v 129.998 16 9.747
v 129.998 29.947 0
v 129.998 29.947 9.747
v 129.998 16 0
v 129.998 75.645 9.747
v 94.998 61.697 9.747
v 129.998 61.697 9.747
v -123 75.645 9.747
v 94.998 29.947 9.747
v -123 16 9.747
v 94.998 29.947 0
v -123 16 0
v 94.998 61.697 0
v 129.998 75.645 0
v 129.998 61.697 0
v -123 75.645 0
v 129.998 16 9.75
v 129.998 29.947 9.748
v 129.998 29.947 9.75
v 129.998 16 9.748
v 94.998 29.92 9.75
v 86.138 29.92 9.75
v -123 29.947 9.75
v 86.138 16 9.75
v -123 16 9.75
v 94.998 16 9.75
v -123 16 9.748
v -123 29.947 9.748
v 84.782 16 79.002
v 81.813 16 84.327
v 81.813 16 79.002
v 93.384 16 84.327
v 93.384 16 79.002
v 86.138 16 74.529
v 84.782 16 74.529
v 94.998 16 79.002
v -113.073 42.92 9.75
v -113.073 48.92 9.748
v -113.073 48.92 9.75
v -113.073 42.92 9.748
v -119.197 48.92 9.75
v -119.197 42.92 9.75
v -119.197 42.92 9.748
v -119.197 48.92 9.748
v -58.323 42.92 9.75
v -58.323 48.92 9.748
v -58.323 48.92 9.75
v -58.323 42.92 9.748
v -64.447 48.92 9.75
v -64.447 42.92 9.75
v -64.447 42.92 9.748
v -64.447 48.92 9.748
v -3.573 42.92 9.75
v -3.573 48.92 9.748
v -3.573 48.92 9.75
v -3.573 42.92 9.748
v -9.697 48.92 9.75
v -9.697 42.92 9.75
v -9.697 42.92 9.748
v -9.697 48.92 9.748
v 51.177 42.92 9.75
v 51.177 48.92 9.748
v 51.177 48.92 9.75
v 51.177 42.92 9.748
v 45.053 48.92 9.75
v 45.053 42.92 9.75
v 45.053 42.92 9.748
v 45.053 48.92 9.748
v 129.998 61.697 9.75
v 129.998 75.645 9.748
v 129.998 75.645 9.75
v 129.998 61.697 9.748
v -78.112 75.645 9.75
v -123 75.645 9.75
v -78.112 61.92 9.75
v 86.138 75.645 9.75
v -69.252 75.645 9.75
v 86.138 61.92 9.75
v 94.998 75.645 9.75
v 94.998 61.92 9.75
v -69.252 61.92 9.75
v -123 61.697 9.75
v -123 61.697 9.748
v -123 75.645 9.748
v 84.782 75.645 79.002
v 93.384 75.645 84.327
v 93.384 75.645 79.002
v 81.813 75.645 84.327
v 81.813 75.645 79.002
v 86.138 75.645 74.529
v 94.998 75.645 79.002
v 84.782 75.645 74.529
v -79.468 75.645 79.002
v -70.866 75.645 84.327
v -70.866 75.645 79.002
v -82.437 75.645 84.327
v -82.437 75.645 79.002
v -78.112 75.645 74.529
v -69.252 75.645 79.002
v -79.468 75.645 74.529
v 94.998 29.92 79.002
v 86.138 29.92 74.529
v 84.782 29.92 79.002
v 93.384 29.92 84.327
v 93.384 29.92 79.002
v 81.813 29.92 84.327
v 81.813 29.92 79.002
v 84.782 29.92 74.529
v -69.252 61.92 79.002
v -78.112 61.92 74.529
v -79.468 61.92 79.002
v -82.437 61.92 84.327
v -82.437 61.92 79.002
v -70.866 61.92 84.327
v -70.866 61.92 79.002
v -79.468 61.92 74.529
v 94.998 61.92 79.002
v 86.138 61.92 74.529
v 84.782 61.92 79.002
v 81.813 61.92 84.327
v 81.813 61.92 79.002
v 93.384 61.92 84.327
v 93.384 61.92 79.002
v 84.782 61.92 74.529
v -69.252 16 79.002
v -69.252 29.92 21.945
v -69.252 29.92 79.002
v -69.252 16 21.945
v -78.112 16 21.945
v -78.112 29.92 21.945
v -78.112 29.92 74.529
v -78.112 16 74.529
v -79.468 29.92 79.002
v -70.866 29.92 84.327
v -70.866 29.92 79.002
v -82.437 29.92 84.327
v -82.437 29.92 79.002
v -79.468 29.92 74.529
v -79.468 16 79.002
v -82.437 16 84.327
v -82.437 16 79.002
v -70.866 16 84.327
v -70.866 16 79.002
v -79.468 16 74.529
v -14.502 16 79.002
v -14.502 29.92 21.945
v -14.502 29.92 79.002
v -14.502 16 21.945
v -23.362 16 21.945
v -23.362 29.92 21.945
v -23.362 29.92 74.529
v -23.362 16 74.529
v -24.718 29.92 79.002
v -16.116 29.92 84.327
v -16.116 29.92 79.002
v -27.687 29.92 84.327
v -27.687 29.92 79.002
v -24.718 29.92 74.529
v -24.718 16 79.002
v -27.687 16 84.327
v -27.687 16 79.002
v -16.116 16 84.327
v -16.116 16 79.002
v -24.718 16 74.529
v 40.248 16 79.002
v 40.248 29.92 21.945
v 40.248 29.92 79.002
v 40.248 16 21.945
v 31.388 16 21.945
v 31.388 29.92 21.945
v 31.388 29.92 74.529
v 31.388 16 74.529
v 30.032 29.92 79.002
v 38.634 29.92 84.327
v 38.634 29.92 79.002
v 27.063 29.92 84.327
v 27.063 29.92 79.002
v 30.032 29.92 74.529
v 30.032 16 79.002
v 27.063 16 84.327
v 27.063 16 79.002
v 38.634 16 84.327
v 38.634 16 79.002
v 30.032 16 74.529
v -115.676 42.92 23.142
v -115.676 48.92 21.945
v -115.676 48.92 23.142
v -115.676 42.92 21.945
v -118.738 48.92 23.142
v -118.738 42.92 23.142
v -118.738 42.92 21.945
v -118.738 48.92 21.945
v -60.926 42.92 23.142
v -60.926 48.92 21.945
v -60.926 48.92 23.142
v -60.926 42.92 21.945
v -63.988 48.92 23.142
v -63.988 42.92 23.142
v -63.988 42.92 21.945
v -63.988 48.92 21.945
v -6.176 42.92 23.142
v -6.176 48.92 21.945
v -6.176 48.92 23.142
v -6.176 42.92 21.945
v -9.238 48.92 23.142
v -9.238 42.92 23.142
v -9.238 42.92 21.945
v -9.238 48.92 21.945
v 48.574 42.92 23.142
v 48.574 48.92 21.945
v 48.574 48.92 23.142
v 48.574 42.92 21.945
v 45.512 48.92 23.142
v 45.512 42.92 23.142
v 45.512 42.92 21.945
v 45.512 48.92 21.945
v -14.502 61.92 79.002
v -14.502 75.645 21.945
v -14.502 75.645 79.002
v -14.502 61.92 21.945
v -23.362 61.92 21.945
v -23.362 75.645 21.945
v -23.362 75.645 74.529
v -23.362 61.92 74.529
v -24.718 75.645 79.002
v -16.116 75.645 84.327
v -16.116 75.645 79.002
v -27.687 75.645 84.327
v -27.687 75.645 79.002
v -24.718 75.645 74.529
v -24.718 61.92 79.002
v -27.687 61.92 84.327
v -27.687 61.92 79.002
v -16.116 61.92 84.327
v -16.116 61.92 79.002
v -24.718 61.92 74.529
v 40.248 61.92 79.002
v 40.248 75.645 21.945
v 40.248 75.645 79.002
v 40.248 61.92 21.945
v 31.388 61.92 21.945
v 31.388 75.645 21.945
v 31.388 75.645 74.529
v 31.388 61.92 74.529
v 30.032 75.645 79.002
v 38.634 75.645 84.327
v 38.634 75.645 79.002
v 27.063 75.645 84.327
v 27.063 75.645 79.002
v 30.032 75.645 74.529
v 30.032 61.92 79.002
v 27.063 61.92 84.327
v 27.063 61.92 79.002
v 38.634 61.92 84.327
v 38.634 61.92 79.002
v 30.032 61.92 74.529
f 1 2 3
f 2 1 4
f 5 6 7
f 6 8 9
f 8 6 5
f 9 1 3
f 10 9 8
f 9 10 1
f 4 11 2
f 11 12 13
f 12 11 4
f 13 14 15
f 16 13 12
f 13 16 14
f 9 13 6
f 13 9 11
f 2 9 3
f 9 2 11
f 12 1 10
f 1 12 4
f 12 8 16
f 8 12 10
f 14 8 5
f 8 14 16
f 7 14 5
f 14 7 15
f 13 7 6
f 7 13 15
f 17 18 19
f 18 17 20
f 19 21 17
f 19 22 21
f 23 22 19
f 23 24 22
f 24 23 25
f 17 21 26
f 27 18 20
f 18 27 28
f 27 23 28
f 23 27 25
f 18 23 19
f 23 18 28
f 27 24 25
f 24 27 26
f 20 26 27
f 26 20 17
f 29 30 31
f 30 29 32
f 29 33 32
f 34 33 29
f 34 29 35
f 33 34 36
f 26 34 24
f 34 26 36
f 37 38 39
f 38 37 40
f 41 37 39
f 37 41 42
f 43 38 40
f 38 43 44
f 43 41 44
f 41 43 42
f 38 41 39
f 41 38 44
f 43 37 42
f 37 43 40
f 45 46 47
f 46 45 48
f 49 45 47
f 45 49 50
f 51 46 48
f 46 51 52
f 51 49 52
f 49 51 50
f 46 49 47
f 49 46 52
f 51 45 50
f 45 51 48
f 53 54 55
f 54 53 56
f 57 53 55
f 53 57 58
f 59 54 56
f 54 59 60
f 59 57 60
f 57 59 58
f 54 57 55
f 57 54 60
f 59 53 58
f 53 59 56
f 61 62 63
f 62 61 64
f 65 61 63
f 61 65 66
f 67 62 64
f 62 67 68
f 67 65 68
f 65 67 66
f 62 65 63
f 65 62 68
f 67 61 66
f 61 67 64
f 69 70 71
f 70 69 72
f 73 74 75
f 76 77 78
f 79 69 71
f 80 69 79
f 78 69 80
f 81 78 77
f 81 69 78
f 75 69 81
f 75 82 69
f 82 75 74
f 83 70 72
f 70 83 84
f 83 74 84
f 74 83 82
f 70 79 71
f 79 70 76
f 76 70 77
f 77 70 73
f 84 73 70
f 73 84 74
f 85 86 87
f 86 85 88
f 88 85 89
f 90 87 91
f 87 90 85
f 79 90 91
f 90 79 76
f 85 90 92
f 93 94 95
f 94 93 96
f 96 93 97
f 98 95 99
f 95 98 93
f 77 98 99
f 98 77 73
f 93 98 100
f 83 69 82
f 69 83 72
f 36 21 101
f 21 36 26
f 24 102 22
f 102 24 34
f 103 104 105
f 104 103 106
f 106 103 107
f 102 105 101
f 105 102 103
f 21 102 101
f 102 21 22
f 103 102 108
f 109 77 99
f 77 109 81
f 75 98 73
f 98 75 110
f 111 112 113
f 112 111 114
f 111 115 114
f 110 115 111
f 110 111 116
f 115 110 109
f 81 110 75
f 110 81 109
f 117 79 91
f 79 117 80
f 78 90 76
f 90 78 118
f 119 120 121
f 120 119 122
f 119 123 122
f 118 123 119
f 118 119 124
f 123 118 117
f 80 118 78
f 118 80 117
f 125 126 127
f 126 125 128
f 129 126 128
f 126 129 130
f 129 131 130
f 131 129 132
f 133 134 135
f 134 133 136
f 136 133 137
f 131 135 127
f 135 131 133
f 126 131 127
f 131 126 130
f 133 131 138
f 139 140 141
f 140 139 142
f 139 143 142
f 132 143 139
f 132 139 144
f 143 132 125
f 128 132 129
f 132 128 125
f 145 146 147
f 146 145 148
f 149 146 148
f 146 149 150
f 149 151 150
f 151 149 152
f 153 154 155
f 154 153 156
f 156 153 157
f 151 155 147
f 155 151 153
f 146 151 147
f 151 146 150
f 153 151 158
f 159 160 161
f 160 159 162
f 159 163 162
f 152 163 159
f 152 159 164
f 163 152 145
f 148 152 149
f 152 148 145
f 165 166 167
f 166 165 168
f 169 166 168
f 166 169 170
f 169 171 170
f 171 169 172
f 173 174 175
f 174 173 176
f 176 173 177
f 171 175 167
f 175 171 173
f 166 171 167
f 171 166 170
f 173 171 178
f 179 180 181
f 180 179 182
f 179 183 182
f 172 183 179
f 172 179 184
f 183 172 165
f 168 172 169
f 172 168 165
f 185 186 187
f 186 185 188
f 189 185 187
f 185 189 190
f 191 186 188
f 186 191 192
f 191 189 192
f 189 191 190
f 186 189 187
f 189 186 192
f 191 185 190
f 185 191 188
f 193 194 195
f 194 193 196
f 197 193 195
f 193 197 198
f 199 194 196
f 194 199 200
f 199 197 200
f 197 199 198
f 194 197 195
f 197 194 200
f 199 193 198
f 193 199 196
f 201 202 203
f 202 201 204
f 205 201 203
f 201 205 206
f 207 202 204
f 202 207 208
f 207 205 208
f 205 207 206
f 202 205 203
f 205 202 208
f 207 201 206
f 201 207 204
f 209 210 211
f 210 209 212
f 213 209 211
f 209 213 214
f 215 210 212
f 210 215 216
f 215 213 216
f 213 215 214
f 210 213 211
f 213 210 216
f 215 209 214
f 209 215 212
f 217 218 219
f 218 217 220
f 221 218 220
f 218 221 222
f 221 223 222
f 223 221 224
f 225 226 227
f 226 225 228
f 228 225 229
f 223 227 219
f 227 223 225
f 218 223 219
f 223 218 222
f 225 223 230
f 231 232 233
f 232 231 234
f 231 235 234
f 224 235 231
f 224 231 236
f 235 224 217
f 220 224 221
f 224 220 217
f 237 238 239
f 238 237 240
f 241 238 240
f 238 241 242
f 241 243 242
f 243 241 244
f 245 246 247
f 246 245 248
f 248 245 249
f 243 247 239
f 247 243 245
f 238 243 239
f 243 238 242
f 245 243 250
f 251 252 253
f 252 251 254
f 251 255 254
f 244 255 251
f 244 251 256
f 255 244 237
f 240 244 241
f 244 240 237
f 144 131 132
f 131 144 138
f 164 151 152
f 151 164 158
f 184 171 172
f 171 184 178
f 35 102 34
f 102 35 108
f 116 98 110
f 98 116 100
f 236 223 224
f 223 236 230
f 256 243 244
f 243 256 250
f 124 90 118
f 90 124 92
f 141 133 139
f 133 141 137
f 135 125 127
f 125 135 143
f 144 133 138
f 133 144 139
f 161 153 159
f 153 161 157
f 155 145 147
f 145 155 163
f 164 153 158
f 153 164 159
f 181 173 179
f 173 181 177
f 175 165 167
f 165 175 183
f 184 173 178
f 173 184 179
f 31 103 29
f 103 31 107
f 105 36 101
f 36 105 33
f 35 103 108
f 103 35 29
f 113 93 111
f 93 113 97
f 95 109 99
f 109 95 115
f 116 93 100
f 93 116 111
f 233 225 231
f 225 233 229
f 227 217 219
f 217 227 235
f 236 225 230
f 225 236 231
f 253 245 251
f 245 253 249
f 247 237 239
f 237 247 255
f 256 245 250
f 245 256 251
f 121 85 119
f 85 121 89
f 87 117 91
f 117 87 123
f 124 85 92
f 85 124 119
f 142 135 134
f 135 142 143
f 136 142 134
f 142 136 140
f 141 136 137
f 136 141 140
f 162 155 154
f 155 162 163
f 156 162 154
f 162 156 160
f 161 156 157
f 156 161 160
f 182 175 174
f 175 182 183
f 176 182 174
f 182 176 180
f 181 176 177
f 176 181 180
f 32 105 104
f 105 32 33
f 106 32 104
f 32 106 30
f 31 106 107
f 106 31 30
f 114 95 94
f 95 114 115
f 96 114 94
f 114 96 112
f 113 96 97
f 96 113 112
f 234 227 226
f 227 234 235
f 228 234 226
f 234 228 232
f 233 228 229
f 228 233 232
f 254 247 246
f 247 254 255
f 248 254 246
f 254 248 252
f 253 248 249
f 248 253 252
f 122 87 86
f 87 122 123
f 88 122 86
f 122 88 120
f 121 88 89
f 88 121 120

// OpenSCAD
// Rewritten from layered polygon rebuild into rectilinear cubes
// Each slab is decomposed into axis-aligned rectangles and emitted as cubes.
// Note: This preserves orthogonal geometry; curved/diagonal features (if any) are approximated.

module rect_prism(x1,y1,x2,y2,z0,h){
  translate([x1,y1,z0]) cube([x2-x1, y2-y1, h], center=false);
}

module slab_1() {
  union() {
    rect_prism(94.997986,15.999999,129.997986,29.946999,0,9.747);
    rect_prism(-123.000008,15.999999,94.997986,75.644997,0,9.747);
    rect_prism(94.997986,61.696999,129.997986,75.644997,0,9.747);
  }
}

module slab_2() {
  union() {
    rect_prism(-123.000008,15.999999,129.997986,29.946999,9.748,0.002);
    rect_prism(-119.196615,42.919998,-113.073431,48.919998,9.748,0.002);
    rect_prism(-64.44663,42.919998,-58.323427,48.919998,9.748,0.002);
    rect_prism(-9.696628,42.919998,-3.573428,48.919998,9.748,0.002);
    rect_prism(45.053381,42.919998,51.176573,48.919998,9.748,0.002);
    rect_prism(-123.000008,61.696999,129.997986,75.644997,9.748,0.002);
  }
}

module slab_3() {
  union() {
    //rect_prism(-78.112015,15.999999,-69.252014,29.919998,9.75,12.195);
    //rect_prism(-23.362015,15.999999,-14.502014,29.919998,9.75,12.195);
    //rect_prism(31.387985,15.999999,40.247986,29.919998,9.75,12.195);
    rect_prism(86.137985,15.999999,94.997986,29.919998,9.75,12.195);
    //rect_prism(-120.43741,42.919998,-114.314075,48.919998,9.75,12.195);
    //rect_prism(-65.687418,42.919998,-59.564071,48.919998,9.75,12.195);
    //rect_prism(-10.937418,42.919998,-4.814072,48.919998,9.75,12.195);
    //rect_prism(43.812582,42.919998,49.935932,48.919998,9.75,12.195);
    rect_prism(-78.112015,61.919998,-69.252014,75.644997,9.75,12.195);
    //rect_prism(-23.362015,61.919998,-14.502014,75.644997,9.75,12.195);
    //rect_prism(31.387985,61.919998,40.247986,75.644997,9.75,12.195);
    rect_prism(86.137985,61.919998,94.997986,75.644997,9.75,12.195);
  }
}

module slab_4() {
  union() {
    rect_prism(-78.112015,15.999999,-69.252014,29.919998,21.945,1.197);
    rect_prism(-23.362015,15.999999,-14.502014,29.919998,21.945,1.197);
    rect_prism(31.387985,15.999999,40.247986,29.919998,21.945,1.197);
    rect_prism(86.137985,15.999999,94.997986,29.919998,21.945,1.197);
    rect_prism(-118.738005,42.919998,-115.676272,48.919998,21.945,1.197);
    rect_prism(-63.988003,42.919998,-60.926268,48.919998,21.945,1.197);
    rect_prism(-9.238005,42.919998,-6.176269,48.919998,21.945,1.197);
    rect_prism(45.511995,42.919998,48.573739,48.919998,21.945,1.197);
    rect_prism(-78.112015,61.919998,-69.252014,75.644997,21.945,1.197);
    rect_prism(-23.362015,61.919998,-14.502014,75.644997,21.945,1.197);
    rect_prism(31.387985,61.919998,40.247986,75.644997,21.945,1.197);
    rect_prism(86.137985,61.919998,94.997986,75.644997,21.945,1.197);
  }
}

module slab_5() {
  union() {
    rect_prism(-78.112015,15.999999,-69.252014,29.919998,23.142,51.387);
    rect_prism(-23.362015,15.999999,-14.502014,29.919998,23.142,51.387);
    rect_prism(31.387985,15.999999,40.247986,29.919998,23.142,51.387);
    rect_prism(86.137985,15.999999,94.997986,29.919998,23.142,51.387);
    rect_prism(-78.112015,61.919998,-69.252014,75.644997,23.142,51.387);
    rect_prism(-23.362015,61.919998,-14.502014,75.644997,23.142,51.387);
    rect_prism(31.387985,61.919998,40.247986,75.644997,23.142,51.387);
    rect_prism(86.137985,61.919998,94.997986,75.644997,23.142,51.387);
  }
}

module slab_6() {
  union() {
    rect_prism(-79.467536,15.999999,-69.252014,29.919998,74.529,4.4726);
    rect_prism(-24.717536,15.999999,-14.502014,29.919998,74.529,4.4726);
    rect_prism(30.032464,15.999999,40.247986,29.919998,74.529,4.4726);
    rect_prism(84.782464,15.999999,94.997986,29.919998,74.529,4.4726);
    rect_prism(-79.467536,61.919998,-69.252014,75.644997,74.529,4.4726);
    rect_prism(-24.717536,61.919998,-14.502014,75.644997,74.529,4.4726);
    rect_prism(30.032464,61.919998,40.247986,75.644997,74.529,4.4726);
    rect_prism(84.782464,61.919998,94.997986,75.644997,74.529,4.4726);
  }
}

module slab_7() {
  union() {
    rect_prism(-82.437039,15.999999,-70.865755,29.919998,79.0016,5.3254);
    rect_prism(-27.687036,15.999999,-16.115755,29.919998,79.0016,5.3254);
    rect_prism(27.062964,15.999999,38.634246,29.919998,79.0016,5.3254);
    rect_prism(81.812961,15.999999,93.384242,29.919998,79.0016,5.3254);
    rect_prism(-82.437039,61.919998,-70.865755,75.644997,79.0016,5.3254);
    rect_prism(-27.687036,61.919998,-16.115755,75.644997,79.0016,5.3254);
    rect_prism(27.062964,61.919998,38.634246,75.644997,79.0016,5.3254);
    rect_prism(81.812961,61.919998,93.384242,75.644997,79.0016,5.3254);
  }
}

module top() {
  union() {
    slab_1();
    slab_2();
    slab_3();
    slab_4();
    slab_5();
    slab_6();
    slab_7();
  }
}

top();
